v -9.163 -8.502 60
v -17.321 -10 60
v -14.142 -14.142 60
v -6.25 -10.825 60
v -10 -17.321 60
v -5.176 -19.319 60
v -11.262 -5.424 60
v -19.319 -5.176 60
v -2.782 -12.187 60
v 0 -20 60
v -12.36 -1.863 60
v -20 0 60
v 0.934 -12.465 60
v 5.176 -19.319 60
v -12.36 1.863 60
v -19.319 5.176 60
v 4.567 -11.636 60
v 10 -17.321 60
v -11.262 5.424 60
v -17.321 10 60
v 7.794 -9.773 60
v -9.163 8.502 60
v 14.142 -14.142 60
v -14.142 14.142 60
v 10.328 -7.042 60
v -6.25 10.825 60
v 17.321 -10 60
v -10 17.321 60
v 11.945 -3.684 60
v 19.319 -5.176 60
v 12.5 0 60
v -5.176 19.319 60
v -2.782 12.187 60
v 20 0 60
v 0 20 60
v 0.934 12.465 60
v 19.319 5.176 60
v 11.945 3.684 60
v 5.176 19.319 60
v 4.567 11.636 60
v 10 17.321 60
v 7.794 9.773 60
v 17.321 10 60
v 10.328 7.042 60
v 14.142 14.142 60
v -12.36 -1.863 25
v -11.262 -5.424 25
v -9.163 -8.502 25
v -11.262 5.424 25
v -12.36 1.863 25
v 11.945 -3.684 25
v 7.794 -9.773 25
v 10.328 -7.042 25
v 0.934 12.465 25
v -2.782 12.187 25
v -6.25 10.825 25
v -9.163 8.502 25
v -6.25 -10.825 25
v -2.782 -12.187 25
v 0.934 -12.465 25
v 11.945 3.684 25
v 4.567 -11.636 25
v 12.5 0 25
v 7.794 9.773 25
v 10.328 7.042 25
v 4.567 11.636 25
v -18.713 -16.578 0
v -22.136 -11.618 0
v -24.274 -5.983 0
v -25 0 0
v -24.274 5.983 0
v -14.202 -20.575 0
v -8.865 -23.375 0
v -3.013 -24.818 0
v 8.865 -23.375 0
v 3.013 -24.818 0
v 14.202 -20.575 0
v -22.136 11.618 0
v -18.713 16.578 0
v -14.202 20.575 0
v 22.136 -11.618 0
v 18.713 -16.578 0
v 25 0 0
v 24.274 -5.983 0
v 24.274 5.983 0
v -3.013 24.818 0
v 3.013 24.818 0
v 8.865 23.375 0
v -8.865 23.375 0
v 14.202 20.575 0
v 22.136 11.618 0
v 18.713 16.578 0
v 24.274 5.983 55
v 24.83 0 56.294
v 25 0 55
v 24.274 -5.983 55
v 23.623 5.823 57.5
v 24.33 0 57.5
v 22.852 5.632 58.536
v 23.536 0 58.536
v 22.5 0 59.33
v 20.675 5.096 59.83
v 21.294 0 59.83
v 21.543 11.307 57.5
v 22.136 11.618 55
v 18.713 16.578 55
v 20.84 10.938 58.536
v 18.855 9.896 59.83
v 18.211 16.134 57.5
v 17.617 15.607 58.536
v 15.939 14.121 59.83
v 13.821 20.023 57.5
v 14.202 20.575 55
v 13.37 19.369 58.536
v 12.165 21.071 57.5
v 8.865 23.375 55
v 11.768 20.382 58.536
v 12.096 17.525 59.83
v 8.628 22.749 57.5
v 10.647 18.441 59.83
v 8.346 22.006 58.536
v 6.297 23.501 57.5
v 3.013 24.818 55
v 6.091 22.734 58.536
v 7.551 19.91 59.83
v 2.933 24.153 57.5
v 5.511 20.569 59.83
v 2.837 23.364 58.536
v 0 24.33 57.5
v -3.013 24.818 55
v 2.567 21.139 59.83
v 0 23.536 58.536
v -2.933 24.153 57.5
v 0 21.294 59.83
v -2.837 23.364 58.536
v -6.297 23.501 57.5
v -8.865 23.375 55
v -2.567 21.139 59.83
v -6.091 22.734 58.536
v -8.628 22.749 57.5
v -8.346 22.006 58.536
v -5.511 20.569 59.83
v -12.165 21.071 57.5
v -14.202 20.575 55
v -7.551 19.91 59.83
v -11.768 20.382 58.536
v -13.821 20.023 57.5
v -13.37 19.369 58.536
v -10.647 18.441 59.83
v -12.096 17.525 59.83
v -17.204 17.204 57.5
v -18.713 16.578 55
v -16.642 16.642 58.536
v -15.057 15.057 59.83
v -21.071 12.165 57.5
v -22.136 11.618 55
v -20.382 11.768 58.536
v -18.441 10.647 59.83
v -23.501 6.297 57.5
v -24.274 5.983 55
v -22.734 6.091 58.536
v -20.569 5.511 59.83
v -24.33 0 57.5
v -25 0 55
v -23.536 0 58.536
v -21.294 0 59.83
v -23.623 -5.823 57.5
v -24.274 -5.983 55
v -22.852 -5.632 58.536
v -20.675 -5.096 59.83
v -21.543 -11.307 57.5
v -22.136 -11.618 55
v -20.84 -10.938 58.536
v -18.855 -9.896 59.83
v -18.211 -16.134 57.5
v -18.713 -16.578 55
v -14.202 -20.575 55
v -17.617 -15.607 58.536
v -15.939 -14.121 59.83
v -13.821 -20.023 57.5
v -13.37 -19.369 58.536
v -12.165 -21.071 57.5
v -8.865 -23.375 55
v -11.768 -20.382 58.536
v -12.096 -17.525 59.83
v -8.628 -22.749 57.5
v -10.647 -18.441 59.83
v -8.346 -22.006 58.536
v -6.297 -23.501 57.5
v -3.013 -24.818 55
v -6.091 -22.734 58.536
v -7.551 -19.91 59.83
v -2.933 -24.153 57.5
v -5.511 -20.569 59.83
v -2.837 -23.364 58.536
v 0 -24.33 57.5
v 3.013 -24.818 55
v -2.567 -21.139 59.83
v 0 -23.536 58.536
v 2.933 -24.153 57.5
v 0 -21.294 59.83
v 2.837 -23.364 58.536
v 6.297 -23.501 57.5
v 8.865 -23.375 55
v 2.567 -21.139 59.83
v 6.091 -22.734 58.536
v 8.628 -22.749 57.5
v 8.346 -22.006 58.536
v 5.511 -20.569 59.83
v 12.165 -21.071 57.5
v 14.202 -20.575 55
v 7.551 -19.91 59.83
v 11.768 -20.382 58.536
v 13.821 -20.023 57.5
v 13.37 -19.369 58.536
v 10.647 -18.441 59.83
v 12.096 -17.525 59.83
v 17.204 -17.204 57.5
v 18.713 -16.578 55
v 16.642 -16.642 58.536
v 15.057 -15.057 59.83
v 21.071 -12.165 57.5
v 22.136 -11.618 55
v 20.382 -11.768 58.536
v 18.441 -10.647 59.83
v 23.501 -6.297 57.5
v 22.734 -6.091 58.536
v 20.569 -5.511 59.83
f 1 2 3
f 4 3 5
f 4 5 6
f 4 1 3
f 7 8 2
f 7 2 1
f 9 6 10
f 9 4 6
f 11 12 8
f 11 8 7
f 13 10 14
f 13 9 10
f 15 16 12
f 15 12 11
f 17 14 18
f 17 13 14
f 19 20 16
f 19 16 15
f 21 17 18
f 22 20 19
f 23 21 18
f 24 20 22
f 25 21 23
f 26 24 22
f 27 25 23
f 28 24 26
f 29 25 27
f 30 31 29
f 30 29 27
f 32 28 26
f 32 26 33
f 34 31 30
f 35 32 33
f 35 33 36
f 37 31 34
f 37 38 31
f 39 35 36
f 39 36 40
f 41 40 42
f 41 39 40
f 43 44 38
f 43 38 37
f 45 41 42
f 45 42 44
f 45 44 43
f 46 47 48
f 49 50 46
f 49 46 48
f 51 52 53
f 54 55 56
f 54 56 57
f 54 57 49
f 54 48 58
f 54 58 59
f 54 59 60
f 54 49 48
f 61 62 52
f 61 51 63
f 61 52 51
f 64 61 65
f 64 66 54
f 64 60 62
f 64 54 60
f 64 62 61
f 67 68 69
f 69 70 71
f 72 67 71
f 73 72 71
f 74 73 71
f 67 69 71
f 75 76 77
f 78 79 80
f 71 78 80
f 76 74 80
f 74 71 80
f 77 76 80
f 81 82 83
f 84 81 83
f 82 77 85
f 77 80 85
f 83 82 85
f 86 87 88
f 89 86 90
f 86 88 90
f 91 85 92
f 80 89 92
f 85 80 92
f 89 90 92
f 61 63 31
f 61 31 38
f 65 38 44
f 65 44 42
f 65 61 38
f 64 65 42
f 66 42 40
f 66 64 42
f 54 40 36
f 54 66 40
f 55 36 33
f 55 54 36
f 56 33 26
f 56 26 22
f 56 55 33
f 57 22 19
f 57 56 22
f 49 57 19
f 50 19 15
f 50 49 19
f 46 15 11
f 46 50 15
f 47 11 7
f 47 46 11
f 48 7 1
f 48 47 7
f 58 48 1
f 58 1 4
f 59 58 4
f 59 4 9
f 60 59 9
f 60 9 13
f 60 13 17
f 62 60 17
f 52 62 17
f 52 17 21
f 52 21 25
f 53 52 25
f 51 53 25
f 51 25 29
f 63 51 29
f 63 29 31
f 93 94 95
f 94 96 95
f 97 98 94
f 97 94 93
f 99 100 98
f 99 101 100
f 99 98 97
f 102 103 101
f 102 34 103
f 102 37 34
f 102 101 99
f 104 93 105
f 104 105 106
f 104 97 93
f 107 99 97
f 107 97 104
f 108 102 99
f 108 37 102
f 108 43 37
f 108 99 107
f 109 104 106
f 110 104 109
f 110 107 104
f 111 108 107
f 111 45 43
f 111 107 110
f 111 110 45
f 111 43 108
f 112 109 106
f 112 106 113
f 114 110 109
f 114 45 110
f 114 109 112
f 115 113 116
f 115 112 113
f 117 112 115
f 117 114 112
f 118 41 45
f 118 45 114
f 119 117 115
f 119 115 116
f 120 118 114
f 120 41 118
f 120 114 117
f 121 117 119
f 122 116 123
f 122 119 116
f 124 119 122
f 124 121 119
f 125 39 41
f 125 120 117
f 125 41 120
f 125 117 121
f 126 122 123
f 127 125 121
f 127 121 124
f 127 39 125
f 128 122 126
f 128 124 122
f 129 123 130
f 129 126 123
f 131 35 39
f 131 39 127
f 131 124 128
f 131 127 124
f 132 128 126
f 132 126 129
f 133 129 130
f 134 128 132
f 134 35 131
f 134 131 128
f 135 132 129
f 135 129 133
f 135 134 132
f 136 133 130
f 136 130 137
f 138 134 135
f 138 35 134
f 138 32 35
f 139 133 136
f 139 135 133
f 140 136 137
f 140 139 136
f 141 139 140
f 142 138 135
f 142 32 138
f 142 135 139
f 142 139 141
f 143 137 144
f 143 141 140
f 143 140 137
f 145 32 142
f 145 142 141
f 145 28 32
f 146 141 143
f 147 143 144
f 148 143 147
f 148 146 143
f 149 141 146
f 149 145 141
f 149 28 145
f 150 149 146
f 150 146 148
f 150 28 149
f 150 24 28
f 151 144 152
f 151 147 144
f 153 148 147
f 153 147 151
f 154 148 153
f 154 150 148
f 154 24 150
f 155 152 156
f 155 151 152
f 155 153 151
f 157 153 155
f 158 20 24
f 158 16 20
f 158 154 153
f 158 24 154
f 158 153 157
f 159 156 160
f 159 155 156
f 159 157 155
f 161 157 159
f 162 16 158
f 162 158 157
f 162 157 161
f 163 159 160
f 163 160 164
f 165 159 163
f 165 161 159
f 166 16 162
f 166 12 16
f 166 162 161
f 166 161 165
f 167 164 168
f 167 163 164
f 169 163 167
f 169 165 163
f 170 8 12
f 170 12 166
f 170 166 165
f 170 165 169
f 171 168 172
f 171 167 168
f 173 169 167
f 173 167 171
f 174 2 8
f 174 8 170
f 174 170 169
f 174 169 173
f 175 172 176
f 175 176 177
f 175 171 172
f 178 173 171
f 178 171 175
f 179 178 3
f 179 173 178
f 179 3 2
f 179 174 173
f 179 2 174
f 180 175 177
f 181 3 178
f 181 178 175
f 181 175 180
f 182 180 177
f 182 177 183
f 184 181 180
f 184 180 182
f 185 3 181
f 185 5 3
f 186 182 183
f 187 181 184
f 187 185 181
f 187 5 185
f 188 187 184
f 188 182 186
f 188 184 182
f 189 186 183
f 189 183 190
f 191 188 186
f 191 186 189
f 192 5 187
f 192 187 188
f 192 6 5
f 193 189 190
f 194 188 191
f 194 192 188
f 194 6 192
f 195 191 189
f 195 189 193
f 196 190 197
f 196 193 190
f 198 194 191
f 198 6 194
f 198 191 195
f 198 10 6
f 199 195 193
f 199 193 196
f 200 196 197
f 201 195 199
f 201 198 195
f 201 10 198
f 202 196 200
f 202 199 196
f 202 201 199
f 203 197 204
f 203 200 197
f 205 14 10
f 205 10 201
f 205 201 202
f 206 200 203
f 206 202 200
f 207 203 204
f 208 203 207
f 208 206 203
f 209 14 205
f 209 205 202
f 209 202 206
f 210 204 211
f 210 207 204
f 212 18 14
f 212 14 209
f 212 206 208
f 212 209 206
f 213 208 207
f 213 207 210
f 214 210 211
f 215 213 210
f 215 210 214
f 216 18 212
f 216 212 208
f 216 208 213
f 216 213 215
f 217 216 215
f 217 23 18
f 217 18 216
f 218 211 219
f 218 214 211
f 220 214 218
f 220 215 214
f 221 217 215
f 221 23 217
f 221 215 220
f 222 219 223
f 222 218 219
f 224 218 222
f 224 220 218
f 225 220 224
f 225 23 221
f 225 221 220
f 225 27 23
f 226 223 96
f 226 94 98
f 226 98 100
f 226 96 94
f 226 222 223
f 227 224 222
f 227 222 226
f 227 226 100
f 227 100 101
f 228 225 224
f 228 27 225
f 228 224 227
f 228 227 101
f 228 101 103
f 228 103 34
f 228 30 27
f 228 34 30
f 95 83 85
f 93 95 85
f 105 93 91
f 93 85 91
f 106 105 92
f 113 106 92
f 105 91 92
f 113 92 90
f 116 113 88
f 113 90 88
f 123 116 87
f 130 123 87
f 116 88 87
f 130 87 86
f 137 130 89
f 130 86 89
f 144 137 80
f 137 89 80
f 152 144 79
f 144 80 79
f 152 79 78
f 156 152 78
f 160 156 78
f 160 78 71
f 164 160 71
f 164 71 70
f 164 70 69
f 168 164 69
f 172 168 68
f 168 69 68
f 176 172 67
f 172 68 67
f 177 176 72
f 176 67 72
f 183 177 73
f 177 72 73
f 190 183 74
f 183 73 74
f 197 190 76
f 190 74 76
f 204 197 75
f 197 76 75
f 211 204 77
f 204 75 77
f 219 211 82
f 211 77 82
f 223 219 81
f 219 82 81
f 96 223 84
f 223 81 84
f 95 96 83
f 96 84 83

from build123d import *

# Parameters (mm, degrees)
F0_R     = 12.5
F1_DEPTH = 25
F0_R_2   = 25
F2_DEPTH = 60
F3_R     = 5


with BuildPart() as f1:
    # F0 (on Top) → F1 (new body)
    with BuildSketch(Plane.XY):
        Circle(F0_R)
    extrude(amount=F1_DEPTH)

    # F0 (on Top) → F2 (join)
    with BuildSketch(Plane.XY):
        Circle(F0_R_2)
        Circle(F0_R, mode=Mode.SUBTRACT)
    extrude(amount=F2_DEPTH)

    # F3
    f3_edges = [f1.edges().sort_by_distance(p)[0] for p in [
        (-25, 0, 60),
    ]]
    fillet(f3_edges, radius=F3_R)


solid = f1.part
